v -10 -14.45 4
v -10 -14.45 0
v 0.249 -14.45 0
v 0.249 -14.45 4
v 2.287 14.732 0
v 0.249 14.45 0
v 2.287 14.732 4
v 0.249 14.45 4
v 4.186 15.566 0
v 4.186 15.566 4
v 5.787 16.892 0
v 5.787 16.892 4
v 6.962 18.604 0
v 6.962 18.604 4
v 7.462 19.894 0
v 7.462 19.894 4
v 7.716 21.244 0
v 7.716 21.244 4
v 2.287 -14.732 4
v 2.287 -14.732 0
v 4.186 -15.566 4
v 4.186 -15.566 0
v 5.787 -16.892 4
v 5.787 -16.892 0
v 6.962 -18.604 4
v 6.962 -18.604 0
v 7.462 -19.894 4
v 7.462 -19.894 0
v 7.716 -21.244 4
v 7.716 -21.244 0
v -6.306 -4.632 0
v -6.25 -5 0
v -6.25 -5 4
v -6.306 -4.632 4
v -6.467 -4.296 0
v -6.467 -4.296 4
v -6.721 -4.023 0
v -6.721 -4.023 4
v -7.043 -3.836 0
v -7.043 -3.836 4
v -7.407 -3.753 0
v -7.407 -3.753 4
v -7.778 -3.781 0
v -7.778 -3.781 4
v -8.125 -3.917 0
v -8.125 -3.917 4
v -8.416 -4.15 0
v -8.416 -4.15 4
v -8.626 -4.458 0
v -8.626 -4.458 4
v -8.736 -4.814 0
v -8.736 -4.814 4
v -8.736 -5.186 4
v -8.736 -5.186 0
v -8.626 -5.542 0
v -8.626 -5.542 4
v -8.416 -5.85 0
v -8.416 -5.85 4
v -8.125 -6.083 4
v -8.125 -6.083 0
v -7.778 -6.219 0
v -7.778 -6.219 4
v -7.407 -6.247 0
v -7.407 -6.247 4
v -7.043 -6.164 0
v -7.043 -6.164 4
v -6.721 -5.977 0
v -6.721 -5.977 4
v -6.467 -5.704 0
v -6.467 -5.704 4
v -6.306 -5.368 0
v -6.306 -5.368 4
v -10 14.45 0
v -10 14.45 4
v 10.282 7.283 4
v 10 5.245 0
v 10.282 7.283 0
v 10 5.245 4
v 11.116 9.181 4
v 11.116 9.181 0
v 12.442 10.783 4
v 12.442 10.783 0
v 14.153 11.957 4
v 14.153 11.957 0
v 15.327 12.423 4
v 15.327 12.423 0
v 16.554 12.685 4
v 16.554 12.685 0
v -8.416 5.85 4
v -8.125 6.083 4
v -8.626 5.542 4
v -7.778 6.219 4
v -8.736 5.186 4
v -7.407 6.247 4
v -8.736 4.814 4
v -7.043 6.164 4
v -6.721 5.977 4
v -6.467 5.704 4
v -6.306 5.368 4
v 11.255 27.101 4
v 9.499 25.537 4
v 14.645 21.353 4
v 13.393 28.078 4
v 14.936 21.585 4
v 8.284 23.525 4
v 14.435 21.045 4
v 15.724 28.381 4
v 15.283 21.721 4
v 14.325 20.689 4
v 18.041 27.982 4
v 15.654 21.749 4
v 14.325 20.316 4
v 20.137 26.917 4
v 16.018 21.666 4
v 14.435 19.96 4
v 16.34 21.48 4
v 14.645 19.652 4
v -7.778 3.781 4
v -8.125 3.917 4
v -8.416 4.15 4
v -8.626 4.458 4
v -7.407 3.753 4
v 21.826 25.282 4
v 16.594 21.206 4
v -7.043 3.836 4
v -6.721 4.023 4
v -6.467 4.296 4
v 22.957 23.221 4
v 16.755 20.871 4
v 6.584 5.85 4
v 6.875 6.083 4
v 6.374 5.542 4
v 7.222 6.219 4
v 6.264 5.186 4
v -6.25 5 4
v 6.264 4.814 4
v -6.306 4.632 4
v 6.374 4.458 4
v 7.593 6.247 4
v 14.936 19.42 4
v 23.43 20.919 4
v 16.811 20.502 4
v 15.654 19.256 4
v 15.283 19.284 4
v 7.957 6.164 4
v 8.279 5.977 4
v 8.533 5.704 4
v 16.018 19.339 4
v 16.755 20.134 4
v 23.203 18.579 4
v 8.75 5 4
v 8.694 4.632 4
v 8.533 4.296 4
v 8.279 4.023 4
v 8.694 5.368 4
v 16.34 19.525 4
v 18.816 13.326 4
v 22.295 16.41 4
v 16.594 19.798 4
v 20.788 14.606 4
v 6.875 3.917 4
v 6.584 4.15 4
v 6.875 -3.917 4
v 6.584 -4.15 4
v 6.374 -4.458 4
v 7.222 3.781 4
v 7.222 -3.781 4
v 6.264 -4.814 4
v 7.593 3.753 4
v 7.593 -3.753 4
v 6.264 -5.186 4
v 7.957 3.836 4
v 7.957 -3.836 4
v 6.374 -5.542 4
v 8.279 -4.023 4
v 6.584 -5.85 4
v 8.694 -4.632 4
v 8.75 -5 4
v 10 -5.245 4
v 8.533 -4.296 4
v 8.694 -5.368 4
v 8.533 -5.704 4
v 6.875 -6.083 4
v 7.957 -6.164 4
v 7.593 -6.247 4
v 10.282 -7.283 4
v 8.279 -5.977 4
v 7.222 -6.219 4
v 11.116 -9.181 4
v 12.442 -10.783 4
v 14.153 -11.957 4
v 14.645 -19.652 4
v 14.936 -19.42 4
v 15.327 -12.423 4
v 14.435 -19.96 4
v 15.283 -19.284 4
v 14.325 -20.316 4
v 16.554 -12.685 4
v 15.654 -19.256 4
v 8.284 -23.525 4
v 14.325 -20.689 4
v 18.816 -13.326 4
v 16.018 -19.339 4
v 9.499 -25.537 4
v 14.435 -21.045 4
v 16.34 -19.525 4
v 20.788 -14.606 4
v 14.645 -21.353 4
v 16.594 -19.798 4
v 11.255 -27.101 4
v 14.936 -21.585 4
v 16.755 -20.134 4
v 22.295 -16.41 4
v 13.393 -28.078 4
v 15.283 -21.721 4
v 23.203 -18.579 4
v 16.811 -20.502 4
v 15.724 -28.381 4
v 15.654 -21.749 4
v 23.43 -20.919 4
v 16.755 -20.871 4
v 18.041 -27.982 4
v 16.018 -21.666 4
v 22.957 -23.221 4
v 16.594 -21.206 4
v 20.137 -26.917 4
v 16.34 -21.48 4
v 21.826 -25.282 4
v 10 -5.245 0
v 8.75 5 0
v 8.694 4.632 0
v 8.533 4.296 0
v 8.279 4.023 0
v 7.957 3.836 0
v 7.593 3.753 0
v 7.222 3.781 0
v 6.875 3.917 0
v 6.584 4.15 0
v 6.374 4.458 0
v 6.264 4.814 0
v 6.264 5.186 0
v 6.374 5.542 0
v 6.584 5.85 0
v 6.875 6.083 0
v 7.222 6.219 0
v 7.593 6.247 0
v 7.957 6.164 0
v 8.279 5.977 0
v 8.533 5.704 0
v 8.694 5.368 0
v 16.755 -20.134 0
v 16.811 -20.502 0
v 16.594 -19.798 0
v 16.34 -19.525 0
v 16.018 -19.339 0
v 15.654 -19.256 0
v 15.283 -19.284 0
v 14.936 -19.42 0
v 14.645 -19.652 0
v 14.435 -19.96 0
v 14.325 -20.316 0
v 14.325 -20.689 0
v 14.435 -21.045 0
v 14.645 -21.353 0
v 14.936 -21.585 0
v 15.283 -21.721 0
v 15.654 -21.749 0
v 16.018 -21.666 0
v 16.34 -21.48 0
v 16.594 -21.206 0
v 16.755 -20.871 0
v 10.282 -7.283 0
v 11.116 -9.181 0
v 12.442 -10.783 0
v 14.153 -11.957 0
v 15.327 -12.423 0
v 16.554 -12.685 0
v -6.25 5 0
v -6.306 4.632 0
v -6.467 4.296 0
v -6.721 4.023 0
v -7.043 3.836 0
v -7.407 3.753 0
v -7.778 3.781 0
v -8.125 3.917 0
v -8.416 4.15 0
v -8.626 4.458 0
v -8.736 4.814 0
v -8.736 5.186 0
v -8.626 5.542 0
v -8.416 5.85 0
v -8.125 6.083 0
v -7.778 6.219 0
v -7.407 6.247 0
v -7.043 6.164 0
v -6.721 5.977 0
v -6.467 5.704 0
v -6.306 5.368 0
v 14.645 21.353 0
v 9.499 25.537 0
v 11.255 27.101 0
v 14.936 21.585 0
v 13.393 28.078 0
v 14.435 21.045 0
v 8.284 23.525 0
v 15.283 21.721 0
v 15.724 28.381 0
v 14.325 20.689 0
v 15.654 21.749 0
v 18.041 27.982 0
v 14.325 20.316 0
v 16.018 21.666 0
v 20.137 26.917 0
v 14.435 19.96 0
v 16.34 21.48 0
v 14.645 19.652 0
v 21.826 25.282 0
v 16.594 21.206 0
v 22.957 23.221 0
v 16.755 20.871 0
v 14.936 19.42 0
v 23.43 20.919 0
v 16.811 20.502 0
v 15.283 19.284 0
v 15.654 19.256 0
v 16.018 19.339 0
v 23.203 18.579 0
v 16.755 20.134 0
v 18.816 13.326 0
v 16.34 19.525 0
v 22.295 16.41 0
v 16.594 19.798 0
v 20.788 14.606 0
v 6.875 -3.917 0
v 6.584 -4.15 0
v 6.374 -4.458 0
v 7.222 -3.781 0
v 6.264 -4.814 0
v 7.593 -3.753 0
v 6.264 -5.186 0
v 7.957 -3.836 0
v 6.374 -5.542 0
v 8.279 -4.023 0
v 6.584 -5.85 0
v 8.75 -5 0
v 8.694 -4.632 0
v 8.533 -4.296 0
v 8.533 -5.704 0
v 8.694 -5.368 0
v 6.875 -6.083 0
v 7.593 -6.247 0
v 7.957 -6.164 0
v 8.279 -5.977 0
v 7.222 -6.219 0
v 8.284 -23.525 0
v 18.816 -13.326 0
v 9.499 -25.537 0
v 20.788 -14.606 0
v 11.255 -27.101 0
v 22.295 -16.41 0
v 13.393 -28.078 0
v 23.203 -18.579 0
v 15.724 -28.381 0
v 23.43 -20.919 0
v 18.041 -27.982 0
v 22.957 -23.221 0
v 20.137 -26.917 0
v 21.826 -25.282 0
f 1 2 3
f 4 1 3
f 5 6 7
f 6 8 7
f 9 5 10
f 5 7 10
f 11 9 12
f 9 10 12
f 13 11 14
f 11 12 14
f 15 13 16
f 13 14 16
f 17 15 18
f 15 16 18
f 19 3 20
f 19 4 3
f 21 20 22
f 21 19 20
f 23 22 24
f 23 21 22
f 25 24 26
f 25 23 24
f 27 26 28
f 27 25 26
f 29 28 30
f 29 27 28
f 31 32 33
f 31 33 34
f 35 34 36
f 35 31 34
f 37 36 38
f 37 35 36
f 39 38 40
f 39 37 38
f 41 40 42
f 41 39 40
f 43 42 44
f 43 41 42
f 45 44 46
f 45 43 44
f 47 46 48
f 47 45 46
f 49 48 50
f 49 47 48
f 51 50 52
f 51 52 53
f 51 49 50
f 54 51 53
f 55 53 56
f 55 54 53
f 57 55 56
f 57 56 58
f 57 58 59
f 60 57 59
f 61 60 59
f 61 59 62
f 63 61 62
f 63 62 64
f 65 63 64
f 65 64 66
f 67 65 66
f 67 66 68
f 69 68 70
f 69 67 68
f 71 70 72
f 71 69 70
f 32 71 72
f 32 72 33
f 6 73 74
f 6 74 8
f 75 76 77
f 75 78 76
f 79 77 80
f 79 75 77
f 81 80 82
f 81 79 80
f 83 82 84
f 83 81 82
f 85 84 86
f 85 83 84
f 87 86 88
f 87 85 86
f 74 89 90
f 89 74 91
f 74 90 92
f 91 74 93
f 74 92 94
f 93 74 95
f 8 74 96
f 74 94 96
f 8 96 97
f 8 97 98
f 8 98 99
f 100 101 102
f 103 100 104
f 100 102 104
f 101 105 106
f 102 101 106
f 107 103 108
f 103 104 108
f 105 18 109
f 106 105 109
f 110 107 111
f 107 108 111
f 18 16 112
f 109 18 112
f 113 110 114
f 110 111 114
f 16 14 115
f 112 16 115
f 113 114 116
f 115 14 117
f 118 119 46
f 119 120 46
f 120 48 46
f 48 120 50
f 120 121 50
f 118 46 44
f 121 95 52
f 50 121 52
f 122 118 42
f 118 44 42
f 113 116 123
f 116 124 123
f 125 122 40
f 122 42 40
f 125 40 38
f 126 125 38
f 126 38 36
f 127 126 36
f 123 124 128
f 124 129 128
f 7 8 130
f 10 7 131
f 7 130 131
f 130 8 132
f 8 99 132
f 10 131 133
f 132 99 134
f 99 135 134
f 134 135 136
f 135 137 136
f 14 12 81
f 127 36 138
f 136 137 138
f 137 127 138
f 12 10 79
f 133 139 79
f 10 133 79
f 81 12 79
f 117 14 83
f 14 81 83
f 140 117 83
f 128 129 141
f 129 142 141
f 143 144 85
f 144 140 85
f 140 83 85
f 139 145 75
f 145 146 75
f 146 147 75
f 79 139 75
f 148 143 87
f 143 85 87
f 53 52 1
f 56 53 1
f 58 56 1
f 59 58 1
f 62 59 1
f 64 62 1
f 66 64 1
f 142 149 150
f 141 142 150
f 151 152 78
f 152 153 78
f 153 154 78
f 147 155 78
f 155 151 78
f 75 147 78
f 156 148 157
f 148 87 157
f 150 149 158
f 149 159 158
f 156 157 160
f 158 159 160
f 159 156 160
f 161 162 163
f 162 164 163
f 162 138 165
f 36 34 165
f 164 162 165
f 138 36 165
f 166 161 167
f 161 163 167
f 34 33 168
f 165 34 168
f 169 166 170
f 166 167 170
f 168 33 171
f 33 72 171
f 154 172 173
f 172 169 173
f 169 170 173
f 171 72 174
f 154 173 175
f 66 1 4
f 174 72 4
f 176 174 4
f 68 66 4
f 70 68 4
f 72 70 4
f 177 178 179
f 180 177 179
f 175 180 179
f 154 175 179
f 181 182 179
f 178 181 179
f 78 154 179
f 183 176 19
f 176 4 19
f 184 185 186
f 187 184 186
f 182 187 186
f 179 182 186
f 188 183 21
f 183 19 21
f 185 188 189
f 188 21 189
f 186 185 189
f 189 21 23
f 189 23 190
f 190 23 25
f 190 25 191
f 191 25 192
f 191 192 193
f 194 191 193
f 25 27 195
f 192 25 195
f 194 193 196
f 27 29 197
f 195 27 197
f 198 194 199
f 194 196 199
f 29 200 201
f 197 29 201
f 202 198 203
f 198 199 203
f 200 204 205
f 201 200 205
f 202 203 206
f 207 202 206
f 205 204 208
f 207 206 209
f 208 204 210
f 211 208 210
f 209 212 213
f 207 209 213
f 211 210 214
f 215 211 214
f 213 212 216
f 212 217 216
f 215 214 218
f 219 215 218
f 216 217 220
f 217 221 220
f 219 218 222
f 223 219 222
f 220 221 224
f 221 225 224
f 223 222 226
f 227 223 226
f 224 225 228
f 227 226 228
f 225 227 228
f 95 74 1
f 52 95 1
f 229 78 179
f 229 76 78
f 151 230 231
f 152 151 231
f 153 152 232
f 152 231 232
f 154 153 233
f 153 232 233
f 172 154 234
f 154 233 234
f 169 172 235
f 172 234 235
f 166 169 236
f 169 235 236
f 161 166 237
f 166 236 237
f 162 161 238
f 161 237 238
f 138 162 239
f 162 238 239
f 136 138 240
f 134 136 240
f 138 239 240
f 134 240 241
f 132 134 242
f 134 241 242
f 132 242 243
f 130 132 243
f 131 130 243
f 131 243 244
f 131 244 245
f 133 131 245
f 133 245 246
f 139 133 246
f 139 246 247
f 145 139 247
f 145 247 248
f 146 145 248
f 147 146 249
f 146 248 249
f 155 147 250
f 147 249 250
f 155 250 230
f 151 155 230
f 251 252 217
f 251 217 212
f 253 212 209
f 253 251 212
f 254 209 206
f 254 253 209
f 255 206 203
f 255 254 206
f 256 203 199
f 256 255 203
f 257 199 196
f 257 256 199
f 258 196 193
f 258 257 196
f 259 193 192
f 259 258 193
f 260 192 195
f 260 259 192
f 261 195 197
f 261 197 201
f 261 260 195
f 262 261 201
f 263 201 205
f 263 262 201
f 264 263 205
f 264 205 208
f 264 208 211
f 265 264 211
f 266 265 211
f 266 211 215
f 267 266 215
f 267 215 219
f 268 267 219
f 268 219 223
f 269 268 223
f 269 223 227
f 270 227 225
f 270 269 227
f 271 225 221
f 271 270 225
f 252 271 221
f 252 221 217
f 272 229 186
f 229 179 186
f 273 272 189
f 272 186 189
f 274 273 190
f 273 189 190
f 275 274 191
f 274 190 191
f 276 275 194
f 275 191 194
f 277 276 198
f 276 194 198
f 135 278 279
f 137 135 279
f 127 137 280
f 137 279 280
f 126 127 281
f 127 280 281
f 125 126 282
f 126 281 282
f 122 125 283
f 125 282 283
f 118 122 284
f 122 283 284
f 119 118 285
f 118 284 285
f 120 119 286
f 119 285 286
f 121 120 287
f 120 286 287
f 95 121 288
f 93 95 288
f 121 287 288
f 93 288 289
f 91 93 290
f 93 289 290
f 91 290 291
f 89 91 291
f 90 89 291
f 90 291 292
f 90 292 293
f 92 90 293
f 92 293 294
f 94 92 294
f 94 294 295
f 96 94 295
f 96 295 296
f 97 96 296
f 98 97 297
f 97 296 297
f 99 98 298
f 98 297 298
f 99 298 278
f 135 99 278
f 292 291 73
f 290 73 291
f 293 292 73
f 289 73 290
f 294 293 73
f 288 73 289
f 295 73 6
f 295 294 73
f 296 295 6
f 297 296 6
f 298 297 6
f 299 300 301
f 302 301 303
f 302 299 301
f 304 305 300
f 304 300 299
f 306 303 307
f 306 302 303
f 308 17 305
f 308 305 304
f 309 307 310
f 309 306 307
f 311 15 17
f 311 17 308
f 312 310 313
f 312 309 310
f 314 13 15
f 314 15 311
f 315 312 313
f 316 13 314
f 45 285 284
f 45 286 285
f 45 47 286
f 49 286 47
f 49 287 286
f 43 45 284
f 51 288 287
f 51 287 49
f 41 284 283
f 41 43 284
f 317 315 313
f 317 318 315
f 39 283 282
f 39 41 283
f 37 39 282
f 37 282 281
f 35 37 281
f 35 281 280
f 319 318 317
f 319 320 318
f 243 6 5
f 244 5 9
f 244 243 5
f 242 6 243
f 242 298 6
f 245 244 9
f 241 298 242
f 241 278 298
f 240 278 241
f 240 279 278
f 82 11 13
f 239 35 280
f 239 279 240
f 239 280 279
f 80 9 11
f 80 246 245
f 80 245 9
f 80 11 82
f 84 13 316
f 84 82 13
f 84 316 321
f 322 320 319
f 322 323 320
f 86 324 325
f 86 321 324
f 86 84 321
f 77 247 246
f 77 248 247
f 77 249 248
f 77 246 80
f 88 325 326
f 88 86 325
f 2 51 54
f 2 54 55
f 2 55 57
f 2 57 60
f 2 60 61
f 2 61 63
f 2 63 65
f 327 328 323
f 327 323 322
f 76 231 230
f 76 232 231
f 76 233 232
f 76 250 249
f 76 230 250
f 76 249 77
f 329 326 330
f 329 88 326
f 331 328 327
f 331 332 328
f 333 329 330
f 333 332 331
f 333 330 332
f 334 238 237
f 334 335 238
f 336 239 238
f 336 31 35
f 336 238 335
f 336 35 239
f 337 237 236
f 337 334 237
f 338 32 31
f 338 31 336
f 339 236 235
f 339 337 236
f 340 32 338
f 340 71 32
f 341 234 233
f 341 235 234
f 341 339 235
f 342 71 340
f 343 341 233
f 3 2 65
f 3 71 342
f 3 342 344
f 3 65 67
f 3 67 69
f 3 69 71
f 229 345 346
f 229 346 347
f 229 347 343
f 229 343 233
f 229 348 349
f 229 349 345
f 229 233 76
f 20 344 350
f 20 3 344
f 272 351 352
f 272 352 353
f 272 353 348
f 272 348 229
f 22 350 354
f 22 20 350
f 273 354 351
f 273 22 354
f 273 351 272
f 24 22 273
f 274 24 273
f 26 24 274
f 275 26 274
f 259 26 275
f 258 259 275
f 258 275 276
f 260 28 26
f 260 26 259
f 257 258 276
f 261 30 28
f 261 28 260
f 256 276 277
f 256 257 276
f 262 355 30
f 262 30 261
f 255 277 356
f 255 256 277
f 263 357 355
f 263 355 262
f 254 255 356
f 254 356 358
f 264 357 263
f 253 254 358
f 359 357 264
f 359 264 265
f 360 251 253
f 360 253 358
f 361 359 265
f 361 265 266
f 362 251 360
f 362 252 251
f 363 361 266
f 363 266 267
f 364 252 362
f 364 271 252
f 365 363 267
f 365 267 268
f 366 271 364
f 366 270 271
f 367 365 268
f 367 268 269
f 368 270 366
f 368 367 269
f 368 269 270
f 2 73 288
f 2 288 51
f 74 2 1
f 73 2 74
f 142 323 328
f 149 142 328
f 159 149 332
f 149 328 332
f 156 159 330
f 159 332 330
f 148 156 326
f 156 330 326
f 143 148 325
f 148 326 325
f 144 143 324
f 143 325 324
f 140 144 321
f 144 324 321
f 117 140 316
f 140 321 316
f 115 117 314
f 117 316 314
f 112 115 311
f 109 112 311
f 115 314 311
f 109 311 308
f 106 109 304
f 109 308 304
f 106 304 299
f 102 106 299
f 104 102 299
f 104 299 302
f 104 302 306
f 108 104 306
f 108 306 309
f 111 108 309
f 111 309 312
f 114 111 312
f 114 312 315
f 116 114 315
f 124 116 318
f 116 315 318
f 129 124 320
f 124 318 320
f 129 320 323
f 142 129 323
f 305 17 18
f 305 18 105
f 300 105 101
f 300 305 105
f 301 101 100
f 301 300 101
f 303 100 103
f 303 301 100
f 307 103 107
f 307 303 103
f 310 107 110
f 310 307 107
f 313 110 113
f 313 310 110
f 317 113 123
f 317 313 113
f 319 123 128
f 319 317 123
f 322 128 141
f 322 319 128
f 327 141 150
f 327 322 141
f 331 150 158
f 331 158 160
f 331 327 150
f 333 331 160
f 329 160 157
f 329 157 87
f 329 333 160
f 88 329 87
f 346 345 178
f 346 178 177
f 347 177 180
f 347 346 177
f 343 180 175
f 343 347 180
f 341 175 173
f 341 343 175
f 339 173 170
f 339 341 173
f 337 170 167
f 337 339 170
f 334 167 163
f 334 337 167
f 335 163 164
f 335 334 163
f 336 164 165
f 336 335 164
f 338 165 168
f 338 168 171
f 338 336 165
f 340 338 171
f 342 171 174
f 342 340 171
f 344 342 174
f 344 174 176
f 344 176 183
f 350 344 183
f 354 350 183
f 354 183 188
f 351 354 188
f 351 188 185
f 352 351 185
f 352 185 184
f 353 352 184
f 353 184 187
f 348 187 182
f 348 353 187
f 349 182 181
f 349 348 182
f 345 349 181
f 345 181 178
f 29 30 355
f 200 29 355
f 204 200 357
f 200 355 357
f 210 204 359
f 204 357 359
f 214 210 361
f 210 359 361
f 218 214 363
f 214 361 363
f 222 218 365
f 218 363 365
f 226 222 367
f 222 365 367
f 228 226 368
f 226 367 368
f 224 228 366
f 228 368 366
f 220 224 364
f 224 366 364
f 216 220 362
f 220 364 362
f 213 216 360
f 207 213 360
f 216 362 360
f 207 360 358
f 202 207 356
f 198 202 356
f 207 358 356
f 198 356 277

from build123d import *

# Parameters (mm, degrees)
SKETCH1_R            = 1.25
BOSS_EXTRUDE1_DEPTH  = 4
FILLET1_R            = 7.5
FILLET1_OF_MIRROR1_R = 7.5


with BuildPart() as part:
    # Sketch1 → Boss-Extrude1 (new body)
    with BuildSketch(Plane.XY):
        with BuildLine():
            Line((-10, -14.45), (7.681, -14.45))
            Line((7.681, -14.45), (7.681, -20.50229958))
            ThreePointArc((7.681, -20.50229958), (21.133001436, -26.074301016), (15.561, -12.62229958))
            Line((15.561, -12.62229958), (10, -12.62229958))
            Line((10, -12.62229958), (10, 0))
            Line((10, 0), (-10, 0))
            Line((-10, 0), (-10, -14.45))
        make_face()
        with Locations((-7.5, -5)):
            Circle(SKETCH1_R, mode=Mode.SUBTRACT)
        with Locations((7.5, -5)):
            Circle(SKETCH1_R, mode=Mode.SUBTRACT)
        with Locations((15.561, -20.50229958)):
            Circle(SKETCH1_R, mode=Mode.SUBTRACT)
    boss_extrude1 = extrude(amount=BOSS_EXTRUDE1_DEPTH)

    # Fillet1
    fillet1_edges = [part.edges().sort_by_distance(p)[0] for p in [
        (7.681, -14.45, 2),
        (10, -12.62229958, 2),
    ]]
    fillet(fillet1_edges, radius=FILLET1_R)

    # Mirror1: Boss-Extrude1 across plane
    add(boss_extrude1.mirror(Plane(origin=(-10, 0, 4), x_dir=(0, 0, 1), z_dir=(0, 1, 0))))

    # Fillet1 of Mirror1
    fillet1_of_mirror1_edges = [part.edges().sort_by_distance(p)[0] for p in [
        (7.681, 14.45, 2),
        (10, 12.62229958, 2),
    ]]
    fillet(fillet1_of_mirror1_edges, radius=FILLET1_OF_MIRROR1_R)


solid = part.part
